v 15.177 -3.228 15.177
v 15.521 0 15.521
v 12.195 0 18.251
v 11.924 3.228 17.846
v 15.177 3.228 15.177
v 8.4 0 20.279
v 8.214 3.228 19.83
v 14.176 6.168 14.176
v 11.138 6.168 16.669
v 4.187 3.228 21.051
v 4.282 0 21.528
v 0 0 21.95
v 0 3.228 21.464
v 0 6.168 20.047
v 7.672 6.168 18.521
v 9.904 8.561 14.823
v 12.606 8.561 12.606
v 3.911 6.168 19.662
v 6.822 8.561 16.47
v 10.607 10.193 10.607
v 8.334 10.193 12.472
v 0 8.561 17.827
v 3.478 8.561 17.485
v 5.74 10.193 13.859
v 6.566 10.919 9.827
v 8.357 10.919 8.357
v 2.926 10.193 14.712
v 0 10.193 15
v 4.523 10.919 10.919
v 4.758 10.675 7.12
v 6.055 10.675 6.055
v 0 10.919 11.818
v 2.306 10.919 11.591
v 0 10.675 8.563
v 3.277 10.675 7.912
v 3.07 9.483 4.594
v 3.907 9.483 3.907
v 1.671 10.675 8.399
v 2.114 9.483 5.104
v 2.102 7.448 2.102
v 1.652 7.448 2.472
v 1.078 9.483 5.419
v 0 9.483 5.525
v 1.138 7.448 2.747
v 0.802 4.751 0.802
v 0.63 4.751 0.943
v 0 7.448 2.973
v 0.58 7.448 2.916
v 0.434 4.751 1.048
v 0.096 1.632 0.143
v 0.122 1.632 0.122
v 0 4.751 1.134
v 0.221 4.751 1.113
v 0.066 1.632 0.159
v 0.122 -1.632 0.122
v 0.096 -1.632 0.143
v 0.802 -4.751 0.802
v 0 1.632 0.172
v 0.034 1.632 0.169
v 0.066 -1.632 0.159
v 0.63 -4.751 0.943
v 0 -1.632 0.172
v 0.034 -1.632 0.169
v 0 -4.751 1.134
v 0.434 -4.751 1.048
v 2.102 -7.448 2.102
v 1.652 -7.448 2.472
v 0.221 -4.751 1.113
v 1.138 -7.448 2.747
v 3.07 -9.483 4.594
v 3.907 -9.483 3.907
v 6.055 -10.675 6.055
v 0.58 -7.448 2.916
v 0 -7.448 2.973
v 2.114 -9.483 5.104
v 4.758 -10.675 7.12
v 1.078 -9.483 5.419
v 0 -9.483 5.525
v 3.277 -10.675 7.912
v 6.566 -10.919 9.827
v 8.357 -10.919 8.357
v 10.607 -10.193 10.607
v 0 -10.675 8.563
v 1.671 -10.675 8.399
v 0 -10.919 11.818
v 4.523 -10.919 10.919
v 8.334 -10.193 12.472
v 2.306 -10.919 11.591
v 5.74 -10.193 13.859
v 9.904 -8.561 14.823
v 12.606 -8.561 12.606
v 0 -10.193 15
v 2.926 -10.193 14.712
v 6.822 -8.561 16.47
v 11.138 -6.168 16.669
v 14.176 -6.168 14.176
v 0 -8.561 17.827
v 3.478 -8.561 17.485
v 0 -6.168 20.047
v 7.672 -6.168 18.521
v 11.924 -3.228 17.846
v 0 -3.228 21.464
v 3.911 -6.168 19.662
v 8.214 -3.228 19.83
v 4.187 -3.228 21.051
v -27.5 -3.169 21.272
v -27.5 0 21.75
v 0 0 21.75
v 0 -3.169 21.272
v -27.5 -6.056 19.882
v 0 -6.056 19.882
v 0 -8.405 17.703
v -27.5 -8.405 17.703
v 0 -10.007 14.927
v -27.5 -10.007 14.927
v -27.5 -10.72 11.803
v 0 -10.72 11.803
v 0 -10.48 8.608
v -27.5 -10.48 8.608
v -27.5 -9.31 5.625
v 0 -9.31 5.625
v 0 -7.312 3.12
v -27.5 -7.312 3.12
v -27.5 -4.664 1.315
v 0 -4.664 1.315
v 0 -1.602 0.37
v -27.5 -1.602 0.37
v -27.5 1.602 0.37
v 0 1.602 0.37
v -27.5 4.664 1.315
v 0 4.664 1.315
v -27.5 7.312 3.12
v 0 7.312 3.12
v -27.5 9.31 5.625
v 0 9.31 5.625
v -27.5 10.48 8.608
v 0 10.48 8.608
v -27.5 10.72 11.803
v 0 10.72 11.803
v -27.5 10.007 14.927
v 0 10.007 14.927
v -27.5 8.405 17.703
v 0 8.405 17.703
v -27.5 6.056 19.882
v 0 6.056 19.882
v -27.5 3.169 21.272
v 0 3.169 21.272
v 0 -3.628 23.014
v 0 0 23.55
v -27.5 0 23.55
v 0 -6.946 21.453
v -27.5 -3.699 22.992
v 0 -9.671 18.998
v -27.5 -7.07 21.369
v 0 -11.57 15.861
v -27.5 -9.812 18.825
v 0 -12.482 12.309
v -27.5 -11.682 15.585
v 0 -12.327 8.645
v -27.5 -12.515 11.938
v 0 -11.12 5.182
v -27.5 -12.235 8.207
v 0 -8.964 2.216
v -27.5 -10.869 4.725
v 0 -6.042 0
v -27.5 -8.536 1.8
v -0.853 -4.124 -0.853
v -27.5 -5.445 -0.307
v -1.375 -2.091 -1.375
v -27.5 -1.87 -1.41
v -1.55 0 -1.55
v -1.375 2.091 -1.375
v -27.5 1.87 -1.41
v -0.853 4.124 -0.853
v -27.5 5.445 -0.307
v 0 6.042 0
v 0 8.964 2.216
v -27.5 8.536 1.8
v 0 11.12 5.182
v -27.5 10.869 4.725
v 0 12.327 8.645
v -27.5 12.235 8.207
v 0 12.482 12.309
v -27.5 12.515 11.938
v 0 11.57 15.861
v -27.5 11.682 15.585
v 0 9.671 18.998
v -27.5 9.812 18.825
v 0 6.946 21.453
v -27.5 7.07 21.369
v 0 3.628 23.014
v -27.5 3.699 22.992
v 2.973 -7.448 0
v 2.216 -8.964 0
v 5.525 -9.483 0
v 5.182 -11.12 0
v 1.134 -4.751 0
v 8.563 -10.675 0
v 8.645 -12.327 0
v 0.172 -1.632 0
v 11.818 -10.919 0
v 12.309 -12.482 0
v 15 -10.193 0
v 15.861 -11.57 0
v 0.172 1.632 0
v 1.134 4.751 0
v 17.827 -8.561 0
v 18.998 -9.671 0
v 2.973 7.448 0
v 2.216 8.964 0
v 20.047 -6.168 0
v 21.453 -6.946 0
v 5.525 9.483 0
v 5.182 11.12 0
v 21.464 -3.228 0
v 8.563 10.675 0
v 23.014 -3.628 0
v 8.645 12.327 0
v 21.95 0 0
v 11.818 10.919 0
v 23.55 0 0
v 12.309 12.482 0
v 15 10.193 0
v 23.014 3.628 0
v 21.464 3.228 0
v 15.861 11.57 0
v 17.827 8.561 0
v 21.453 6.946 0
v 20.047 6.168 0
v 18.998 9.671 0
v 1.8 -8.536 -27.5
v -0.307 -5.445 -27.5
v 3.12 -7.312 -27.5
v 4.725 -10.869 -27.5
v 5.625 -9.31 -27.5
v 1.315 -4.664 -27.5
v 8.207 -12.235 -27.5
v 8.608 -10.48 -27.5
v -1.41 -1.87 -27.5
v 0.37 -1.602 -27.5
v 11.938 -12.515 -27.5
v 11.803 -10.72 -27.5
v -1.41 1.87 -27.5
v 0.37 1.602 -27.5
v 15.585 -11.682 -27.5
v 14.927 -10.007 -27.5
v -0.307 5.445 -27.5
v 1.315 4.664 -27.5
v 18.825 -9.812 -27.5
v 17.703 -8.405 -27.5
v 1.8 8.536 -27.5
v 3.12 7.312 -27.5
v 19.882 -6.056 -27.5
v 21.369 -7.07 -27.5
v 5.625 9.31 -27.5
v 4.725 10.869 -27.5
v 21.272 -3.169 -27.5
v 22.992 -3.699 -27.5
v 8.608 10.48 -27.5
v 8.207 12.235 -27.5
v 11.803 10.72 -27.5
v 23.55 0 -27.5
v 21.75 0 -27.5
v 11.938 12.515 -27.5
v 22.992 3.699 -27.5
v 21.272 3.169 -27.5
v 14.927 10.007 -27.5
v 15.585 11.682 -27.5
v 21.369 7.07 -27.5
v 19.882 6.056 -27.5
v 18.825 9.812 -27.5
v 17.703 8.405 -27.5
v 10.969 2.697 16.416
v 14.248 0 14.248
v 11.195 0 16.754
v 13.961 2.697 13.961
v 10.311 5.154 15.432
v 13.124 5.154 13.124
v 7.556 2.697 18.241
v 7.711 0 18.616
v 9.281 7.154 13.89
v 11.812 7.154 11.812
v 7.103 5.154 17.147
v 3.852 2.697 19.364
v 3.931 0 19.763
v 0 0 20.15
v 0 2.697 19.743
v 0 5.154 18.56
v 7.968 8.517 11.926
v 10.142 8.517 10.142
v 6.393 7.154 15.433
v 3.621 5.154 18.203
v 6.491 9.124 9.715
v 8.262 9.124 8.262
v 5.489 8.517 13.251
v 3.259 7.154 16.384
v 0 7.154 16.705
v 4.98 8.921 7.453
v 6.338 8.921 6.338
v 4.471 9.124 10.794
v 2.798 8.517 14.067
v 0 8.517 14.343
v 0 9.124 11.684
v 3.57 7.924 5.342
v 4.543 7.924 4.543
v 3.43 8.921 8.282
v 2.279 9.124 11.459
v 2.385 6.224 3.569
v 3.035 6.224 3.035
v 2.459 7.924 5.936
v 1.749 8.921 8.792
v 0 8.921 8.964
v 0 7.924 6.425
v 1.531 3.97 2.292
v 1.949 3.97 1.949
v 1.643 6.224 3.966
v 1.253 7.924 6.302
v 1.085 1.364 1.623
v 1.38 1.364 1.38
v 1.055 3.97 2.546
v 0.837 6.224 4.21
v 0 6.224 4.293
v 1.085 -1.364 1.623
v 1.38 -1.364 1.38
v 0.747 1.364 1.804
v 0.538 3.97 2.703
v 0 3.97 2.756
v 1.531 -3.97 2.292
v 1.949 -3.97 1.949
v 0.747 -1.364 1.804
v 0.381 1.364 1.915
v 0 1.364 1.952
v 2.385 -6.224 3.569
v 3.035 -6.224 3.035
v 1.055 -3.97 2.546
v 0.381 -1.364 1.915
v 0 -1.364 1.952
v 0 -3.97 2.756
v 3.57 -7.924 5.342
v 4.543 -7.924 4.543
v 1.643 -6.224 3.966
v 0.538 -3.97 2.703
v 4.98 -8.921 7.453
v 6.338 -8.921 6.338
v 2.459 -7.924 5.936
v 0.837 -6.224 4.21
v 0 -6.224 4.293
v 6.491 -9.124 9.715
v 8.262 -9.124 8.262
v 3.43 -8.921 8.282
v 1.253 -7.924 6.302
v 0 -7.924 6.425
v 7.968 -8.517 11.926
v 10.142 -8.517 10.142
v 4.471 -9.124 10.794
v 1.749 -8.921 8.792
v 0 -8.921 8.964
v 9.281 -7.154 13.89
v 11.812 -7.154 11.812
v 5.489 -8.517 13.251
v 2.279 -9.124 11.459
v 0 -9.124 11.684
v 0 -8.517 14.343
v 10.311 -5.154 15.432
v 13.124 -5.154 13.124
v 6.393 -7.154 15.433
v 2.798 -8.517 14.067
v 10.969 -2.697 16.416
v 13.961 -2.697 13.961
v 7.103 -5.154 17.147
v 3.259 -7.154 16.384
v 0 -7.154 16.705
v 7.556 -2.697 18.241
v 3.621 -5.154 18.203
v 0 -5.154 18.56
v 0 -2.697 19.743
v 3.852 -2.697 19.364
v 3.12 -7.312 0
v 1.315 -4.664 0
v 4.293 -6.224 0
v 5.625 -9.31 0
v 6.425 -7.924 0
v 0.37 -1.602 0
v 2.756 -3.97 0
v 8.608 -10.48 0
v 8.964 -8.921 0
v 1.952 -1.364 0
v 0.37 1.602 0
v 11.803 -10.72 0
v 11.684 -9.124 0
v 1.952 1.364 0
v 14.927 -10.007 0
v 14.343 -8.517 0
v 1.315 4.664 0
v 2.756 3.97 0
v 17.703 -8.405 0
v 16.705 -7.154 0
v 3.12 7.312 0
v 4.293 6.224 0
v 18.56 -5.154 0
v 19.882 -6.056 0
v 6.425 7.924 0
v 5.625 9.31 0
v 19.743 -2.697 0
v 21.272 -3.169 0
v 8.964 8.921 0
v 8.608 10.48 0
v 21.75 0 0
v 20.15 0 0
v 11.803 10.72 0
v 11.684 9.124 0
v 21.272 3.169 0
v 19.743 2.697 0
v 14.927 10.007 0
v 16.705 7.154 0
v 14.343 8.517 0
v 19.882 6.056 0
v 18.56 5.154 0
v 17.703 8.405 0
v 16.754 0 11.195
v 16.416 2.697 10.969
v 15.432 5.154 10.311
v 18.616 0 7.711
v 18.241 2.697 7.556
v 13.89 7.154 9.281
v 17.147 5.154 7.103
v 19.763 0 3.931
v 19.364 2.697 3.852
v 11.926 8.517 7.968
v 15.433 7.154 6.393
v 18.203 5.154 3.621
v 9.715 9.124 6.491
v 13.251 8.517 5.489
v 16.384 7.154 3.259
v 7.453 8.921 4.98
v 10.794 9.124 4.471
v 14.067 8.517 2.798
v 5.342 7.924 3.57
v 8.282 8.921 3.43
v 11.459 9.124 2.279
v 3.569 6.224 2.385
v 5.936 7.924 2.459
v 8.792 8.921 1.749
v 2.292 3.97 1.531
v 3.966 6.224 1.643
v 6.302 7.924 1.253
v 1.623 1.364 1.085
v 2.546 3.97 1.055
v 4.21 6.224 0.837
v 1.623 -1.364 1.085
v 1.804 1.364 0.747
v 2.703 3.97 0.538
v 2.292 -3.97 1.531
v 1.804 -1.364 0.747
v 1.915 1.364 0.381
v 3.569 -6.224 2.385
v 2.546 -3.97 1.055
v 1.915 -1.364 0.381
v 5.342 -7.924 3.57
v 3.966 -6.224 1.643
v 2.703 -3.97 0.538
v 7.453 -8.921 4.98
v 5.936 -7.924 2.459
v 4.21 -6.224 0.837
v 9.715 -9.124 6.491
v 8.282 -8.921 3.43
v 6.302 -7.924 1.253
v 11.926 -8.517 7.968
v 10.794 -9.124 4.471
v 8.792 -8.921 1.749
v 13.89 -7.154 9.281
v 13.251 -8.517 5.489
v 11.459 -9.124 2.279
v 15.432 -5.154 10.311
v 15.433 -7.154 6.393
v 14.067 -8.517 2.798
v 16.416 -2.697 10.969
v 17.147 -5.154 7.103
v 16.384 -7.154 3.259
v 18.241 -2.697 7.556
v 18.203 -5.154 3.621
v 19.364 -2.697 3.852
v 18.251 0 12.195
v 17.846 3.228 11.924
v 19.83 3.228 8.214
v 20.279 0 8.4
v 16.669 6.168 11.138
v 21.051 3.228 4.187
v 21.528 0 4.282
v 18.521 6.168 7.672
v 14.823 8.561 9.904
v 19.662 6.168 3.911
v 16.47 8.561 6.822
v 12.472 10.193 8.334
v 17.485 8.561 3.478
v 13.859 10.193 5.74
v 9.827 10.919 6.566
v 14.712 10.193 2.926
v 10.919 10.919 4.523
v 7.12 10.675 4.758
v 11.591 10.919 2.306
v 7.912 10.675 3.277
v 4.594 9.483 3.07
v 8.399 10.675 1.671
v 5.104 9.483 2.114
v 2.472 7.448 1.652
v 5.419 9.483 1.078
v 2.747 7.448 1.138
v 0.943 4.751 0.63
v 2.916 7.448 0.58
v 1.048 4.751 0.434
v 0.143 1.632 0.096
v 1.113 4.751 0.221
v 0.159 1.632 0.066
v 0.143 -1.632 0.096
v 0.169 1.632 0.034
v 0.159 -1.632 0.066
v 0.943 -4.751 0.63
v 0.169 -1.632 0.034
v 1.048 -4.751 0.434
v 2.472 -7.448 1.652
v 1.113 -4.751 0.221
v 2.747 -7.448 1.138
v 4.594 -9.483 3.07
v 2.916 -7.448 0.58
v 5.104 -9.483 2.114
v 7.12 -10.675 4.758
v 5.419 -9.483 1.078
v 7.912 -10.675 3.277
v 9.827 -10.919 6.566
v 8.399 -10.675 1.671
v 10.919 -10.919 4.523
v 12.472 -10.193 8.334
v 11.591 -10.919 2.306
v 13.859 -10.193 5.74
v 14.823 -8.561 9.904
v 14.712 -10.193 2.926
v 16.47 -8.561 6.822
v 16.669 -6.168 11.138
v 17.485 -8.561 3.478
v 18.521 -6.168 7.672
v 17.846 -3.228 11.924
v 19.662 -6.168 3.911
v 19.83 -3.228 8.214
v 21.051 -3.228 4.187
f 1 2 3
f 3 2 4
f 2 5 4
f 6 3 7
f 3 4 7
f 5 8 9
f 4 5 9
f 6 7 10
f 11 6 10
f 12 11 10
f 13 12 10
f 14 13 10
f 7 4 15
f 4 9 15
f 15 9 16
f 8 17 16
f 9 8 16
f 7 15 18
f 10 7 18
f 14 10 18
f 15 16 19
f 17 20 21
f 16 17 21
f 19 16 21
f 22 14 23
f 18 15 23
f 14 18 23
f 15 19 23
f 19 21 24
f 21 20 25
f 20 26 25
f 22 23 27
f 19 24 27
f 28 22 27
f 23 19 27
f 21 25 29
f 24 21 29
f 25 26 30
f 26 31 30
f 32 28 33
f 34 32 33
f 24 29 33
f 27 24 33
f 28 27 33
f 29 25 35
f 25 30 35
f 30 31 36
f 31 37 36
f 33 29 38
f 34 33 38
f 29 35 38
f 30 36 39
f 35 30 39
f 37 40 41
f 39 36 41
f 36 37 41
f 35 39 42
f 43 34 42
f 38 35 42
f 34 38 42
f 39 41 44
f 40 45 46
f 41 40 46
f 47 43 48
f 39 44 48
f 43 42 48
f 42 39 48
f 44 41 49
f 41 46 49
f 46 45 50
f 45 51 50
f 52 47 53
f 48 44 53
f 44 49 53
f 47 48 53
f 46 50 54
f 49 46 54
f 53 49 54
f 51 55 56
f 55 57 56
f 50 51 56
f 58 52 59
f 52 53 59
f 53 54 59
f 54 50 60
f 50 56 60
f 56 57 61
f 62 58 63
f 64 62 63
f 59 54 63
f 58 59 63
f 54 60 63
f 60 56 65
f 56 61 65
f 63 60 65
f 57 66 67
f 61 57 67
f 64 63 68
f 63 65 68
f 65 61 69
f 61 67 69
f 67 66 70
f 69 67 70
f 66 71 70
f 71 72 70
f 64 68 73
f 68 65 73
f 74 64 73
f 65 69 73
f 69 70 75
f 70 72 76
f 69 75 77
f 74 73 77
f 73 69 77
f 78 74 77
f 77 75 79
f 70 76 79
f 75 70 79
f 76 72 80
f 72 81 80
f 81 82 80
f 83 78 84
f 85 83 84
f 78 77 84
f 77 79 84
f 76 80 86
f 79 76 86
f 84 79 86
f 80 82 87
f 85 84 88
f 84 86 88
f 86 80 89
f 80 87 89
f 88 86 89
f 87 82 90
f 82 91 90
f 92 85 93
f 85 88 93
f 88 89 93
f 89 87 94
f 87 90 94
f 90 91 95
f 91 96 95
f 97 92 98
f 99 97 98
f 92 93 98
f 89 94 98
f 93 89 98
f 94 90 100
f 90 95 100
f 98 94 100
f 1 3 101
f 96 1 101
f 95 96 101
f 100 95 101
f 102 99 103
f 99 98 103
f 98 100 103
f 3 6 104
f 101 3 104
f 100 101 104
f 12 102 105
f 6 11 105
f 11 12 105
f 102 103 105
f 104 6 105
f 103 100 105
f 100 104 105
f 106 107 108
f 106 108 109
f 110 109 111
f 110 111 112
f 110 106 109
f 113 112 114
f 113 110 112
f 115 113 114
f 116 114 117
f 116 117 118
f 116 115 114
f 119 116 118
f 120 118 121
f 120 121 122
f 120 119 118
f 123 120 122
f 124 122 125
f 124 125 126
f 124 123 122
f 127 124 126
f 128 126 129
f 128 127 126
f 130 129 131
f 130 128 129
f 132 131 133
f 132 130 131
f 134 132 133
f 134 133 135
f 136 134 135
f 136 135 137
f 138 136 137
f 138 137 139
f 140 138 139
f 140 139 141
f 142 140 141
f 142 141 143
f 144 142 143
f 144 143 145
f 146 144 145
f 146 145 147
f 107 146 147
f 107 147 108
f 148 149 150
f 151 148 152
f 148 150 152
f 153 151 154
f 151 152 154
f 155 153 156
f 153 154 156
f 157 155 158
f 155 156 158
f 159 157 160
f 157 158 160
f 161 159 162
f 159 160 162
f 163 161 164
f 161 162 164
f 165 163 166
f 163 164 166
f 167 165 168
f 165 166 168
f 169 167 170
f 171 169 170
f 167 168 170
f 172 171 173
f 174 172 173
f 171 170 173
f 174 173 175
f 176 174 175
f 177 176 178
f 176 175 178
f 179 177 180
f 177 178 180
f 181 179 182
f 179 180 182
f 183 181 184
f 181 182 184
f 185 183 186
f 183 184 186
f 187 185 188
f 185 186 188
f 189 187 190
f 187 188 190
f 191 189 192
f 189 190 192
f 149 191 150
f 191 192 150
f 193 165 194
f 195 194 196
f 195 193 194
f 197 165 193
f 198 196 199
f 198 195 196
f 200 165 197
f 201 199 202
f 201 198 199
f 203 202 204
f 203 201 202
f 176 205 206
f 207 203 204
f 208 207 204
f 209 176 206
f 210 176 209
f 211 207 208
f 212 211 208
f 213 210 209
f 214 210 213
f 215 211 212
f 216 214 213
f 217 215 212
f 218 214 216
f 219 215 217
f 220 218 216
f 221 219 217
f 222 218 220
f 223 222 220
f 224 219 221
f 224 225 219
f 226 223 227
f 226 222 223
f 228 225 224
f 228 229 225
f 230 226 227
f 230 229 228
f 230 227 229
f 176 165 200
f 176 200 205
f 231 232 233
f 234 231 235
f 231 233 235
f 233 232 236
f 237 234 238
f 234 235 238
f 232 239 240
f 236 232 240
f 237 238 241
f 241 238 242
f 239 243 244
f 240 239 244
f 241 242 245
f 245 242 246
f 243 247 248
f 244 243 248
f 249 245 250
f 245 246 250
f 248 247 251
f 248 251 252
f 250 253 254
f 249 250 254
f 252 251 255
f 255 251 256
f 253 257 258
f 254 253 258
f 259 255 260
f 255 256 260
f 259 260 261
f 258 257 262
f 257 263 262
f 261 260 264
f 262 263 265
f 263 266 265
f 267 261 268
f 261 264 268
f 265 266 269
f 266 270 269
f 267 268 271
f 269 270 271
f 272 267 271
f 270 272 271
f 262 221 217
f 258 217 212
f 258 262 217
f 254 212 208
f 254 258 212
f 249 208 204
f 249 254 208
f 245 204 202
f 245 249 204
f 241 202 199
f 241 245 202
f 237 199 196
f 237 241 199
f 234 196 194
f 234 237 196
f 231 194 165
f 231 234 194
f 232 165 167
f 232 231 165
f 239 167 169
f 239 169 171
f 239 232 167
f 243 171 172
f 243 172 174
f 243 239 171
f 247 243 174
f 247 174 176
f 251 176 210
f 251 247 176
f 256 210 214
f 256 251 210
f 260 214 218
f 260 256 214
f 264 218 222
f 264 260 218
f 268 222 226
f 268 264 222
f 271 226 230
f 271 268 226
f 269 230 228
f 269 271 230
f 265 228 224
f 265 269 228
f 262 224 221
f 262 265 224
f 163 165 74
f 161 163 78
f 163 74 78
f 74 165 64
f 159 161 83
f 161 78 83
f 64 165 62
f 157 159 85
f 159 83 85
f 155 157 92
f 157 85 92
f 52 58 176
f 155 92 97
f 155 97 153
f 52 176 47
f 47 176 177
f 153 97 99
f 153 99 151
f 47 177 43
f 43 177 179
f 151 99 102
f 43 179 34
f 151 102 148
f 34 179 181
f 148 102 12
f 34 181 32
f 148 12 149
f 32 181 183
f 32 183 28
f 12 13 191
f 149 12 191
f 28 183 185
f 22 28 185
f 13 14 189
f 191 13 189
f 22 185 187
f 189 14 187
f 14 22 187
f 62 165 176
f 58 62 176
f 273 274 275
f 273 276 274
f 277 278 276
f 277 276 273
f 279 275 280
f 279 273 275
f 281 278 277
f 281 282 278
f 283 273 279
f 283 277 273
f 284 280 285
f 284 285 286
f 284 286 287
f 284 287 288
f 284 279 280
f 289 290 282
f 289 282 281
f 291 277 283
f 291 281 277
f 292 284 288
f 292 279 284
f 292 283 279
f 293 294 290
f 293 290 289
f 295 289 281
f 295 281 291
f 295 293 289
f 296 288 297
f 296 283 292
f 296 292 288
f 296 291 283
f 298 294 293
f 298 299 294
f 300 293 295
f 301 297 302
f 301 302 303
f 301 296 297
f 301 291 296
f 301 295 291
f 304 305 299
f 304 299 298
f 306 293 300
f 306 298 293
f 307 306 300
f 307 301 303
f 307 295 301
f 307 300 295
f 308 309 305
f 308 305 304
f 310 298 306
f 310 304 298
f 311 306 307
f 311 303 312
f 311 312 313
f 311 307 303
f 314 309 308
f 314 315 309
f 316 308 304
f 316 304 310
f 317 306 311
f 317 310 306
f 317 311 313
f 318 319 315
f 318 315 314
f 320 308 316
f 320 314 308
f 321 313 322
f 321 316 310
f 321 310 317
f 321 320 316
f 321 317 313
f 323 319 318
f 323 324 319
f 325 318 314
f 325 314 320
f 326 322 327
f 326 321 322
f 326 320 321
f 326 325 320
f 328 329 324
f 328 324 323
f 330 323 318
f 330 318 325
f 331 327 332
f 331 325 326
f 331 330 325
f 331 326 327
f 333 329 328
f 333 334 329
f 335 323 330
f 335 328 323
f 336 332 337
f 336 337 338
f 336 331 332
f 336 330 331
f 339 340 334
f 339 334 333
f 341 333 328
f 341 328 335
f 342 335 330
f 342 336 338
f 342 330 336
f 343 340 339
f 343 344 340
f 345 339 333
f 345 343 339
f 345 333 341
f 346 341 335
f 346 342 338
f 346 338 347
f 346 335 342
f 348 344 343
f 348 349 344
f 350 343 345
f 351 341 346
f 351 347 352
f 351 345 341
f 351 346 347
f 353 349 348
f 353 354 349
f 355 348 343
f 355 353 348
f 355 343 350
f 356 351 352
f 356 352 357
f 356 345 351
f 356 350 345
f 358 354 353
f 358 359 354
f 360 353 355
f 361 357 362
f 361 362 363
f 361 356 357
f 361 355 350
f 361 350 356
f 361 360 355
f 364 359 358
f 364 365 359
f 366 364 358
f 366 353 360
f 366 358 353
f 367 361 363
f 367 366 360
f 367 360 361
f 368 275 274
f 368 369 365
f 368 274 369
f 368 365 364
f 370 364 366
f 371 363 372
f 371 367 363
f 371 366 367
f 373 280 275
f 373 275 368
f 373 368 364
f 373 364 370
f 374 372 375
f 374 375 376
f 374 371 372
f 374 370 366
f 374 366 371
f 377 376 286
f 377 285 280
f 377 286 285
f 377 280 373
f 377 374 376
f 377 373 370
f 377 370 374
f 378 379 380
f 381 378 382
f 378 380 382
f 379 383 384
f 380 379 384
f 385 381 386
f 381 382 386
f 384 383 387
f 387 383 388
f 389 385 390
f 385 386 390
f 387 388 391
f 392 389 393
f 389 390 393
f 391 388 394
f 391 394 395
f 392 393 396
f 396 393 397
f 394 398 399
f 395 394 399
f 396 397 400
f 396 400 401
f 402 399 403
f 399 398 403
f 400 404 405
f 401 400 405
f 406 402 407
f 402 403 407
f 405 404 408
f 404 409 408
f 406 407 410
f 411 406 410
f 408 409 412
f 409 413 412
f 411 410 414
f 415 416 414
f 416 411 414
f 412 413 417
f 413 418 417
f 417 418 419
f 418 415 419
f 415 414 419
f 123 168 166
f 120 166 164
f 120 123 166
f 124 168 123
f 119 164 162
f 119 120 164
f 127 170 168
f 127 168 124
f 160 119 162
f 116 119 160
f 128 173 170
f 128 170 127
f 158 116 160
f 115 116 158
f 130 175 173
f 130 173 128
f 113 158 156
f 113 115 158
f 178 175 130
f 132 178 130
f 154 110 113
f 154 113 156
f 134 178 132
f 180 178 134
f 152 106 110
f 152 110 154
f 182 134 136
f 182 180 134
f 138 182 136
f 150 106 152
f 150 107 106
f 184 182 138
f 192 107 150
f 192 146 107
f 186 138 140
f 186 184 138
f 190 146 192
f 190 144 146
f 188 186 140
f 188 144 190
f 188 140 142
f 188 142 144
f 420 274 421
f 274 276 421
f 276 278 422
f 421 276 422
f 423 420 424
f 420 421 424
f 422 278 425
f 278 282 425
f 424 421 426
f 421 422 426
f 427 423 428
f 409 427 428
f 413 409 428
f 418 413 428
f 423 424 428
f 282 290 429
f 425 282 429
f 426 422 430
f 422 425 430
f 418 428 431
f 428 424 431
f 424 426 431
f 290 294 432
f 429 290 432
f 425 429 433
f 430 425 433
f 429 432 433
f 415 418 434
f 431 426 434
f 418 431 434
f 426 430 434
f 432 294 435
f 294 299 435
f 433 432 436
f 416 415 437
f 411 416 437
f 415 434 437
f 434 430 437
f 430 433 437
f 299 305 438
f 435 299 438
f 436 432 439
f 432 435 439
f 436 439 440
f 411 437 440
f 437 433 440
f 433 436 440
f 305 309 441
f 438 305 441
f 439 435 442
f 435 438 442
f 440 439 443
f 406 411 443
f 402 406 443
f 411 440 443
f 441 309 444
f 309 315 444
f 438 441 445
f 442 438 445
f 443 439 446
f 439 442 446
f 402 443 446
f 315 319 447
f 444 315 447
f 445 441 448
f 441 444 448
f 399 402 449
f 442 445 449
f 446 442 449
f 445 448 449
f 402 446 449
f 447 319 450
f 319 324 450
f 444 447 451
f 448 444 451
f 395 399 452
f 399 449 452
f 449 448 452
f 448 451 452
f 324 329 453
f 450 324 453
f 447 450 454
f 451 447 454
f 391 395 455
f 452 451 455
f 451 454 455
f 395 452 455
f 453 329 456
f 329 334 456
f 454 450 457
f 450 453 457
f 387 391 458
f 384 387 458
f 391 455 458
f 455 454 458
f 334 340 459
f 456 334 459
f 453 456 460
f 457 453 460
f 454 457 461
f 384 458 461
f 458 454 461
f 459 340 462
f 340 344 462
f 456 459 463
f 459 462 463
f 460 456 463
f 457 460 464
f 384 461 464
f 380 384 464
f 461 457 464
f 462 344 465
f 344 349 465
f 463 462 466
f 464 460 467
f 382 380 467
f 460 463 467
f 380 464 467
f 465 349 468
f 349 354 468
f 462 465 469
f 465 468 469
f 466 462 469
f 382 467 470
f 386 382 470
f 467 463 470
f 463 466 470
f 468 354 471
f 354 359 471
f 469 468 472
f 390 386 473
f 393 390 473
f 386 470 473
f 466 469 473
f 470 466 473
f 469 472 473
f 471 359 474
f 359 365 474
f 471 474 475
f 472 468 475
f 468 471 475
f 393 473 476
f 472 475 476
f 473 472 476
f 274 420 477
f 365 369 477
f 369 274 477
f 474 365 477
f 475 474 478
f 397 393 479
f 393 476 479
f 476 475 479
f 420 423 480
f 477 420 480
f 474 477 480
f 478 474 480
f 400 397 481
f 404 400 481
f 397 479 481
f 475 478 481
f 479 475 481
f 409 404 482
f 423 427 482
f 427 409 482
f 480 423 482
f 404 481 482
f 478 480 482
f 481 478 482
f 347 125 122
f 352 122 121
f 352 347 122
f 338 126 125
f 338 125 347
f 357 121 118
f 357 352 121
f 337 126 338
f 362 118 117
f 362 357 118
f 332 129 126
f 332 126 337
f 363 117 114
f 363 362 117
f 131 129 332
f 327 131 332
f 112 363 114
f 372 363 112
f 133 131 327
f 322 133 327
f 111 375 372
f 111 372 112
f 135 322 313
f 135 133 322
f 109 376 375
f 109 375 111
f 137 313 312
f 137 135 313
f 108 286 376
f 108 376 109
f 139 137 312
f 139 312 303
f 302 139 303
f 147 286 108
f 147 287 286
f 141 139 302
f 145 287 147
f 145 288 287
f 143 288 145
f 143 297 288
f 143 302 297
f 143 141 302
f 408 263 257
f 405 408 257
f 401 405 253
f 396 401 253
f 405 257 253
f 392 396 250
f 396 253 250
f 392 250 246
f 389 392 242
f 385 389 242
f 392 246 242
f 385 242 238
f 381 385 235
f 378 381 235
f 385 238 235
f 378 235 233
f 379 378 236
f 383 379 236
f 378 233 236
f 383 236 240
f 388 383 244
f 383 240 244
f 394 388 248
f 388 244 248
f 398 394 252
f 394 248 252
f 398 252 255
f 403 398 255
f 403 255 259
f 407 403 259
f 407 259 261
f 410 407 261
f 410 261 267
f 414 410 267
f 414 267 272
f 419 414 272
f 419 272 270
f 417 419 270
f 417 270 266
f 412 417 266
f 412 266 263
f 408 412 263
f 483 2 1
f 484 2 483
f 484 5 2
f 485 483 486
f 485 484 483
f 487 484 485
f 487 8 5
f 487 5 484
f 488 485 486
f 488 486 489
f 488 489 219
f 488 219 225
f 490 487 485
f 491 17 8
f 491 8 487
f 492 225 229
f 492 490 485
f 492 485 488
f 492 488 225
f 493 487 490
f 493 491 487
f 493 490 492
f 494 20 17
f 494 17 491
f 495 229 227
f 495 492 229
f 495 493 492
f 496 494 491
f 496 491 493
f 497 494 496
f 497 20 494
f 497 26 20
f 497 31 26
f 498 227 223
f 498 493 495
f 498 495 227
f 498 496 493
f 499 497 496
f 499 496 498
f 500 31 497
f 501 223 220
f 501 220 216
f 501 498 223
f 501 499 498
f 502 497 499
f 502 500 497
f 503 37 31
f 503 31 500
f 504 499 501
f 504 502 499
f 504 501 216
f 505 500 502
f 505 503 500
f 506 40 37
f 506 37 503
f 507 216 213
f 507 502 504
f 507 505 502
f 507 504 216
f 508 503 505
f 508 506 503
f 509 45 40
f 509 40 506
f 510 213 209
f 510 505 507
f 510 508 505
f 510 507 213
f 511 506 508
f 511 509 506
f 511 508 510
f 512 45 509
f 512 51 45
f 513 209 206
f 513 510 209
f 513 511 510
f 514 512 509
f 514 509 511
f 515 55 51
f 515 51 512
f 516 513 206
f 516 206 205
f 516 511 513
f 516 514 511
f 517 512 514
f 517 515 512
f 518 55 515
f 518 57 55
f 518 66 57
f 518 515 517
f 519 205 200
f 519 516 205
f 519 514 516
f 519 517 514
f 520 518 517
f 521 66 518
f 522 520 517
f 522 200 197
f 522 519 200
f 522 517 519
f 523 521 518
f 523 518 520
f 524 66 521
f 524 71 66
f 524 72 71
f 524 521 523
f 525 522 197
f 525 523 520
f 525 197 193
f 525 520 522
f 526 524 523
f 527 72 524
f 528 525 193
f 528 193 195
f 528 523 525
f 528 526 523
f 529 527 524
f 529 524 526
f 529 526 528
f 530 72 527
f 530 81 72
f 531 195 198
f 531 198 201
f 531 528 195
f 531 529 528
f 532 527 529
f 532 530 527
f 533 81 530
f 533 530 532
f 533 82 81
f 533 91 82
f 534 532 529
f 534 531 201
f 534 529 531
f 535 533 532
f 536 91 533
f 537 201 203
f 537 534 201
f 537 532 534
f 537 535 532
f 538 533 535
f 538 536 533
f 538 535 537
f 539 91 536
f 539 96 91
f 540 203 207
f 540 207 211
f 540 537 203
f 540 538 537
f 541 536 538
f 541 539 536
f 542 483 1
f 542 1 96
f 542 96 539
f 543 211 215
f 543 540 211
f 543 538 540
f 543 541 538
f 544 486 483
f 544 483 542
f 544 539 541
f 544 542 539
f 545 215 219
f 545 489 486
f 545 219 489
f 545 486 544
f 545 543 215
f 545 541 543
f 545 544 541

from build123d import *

# Parameters (mm, degrees)
F1_R   = 10.95
F1_R_2 = 10.75
F1_R_3 = 9.15
F1_R_4 = 12.55


with BuildPart() as f2:
    # F2: sweep along a path in F0
    with BuildLine(Plane.XZ) as f2_path:
        ThreePointArc((7.7781745931, 7.7781745931), (10.1626748576, 4.209517756), (11, 0))
    # F1 (on Top) → F2 (sweep)
    with BuildSketch(Plane.XY):
        with Locations((11, 0)):
            Circle(F1_R)
        with Locations((11, 0)):
            Circle(F1_R_2, mode=Mode.SUBTRACT)
        with Locations((11, 0)):
            Circle(F1_R_2)
        with Locations((11, 0)):
            Circle(F1_R_3, mode=Mode.SUBTRACT)
    sweep(path=f2_path.line)

    # F3: sweep along a path in F0
    with BuildLine(Plane.XZ) as f3_path:
        Line((11, 0), (11, -27.5))
    # F1 (on Top) → F3 (sweep)
    with BuildSketch(Plane.XY):
        with Locations((11, 0)):
            Circle(F1_R_4)
        with Locations((11, 0)):
            Circle(F1_R, mode=Mode.SUBTRACT)
        with Locations((11, 0)):
            Circle(F1_R)
        with Locations((11, 0)):
            Circle(F1_R_2, mode=Mode.SUBTRACT)
    sweep(path=f3_path.line)

    # F4: F2 across face


with BuildPart() as f2_1:
    add(f2.part)
    add(f2.part.mirror(Plane(origin=(7.7781745931, 0, 7.7781745931), x_dir=(0, -1, 0), z_dir=(-0.7071067812, 0, 0.7071067812))))


solid = f2_1.part
